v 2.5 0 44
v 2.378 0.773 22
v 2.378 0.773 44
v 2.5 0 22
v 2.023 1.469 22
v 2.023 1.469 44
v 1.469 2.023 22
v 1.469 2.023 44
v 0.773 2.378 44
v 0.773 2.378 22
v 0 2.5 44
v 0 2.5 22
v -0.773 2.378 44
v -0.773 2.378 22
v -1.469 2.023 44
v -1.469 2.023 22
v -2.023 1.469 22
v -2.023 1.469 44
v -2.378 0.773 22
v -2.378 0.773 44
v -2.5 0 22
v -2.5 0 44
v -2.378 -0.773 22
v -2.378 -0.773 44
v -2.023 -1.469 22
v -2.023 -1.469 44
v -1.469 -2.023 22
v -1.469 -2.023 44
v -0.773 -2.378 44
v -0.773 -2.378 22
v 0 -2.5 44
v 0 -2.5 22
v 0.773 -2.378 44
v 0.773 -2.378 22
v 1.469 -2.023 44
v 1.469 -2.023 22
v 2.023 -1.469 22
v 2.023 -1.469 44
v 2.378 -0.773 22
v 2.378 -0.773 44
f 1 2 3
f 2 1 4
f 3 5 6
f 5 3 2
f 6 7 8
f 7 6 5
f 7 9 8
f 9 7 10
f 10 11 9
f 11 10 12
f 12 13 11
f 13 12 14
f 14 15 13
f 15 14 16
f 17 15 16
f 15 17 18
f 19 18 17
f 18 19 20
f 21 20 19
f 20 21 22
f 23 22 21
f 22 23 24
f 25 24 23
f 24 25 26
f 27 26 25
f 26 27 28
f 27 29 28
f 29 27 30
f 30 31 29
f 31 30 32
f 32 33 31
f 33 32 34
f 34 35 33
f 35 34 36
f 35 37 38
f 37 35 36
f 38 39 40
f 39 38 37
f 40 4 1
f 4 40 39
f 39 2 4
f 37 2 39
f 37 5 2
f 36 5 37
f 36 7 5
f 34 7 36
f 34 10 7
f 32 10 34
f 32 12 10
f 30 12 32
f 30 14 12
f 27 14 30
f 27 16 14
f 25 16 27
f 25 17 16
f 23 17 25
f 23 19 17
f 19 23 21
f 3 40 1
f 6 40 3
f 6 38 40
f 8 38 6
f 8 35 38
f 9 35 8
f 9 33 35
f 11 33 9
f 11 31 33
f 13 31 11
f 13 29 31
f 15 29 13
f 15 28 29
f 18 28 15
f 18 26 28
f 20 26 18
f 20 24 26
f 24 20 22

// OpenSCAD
bevel = 8;
hi = 50;
l=43;
shaft_len=20;

*difference() {
  cube([l,l,hi], center=true);

  for(i=[0:3]) {
    color("green")
      rotate([0,0,90*i])
        translate([l/2,l/2,0])
          rotate([0,0,45])
            cube([bevel,bevel,hi+10],center=true);
  }

  translate([0,0,shaft_len/2+hi/2-2])
    cylinder(r=5/2, h=shaft_len+2,center=true, $fn=20);
}

translate([0,0,shaft_len/2+hi/2-2])
    cylinder(r=5/2, h=shaft_len+2,center=true, $fn=20);
